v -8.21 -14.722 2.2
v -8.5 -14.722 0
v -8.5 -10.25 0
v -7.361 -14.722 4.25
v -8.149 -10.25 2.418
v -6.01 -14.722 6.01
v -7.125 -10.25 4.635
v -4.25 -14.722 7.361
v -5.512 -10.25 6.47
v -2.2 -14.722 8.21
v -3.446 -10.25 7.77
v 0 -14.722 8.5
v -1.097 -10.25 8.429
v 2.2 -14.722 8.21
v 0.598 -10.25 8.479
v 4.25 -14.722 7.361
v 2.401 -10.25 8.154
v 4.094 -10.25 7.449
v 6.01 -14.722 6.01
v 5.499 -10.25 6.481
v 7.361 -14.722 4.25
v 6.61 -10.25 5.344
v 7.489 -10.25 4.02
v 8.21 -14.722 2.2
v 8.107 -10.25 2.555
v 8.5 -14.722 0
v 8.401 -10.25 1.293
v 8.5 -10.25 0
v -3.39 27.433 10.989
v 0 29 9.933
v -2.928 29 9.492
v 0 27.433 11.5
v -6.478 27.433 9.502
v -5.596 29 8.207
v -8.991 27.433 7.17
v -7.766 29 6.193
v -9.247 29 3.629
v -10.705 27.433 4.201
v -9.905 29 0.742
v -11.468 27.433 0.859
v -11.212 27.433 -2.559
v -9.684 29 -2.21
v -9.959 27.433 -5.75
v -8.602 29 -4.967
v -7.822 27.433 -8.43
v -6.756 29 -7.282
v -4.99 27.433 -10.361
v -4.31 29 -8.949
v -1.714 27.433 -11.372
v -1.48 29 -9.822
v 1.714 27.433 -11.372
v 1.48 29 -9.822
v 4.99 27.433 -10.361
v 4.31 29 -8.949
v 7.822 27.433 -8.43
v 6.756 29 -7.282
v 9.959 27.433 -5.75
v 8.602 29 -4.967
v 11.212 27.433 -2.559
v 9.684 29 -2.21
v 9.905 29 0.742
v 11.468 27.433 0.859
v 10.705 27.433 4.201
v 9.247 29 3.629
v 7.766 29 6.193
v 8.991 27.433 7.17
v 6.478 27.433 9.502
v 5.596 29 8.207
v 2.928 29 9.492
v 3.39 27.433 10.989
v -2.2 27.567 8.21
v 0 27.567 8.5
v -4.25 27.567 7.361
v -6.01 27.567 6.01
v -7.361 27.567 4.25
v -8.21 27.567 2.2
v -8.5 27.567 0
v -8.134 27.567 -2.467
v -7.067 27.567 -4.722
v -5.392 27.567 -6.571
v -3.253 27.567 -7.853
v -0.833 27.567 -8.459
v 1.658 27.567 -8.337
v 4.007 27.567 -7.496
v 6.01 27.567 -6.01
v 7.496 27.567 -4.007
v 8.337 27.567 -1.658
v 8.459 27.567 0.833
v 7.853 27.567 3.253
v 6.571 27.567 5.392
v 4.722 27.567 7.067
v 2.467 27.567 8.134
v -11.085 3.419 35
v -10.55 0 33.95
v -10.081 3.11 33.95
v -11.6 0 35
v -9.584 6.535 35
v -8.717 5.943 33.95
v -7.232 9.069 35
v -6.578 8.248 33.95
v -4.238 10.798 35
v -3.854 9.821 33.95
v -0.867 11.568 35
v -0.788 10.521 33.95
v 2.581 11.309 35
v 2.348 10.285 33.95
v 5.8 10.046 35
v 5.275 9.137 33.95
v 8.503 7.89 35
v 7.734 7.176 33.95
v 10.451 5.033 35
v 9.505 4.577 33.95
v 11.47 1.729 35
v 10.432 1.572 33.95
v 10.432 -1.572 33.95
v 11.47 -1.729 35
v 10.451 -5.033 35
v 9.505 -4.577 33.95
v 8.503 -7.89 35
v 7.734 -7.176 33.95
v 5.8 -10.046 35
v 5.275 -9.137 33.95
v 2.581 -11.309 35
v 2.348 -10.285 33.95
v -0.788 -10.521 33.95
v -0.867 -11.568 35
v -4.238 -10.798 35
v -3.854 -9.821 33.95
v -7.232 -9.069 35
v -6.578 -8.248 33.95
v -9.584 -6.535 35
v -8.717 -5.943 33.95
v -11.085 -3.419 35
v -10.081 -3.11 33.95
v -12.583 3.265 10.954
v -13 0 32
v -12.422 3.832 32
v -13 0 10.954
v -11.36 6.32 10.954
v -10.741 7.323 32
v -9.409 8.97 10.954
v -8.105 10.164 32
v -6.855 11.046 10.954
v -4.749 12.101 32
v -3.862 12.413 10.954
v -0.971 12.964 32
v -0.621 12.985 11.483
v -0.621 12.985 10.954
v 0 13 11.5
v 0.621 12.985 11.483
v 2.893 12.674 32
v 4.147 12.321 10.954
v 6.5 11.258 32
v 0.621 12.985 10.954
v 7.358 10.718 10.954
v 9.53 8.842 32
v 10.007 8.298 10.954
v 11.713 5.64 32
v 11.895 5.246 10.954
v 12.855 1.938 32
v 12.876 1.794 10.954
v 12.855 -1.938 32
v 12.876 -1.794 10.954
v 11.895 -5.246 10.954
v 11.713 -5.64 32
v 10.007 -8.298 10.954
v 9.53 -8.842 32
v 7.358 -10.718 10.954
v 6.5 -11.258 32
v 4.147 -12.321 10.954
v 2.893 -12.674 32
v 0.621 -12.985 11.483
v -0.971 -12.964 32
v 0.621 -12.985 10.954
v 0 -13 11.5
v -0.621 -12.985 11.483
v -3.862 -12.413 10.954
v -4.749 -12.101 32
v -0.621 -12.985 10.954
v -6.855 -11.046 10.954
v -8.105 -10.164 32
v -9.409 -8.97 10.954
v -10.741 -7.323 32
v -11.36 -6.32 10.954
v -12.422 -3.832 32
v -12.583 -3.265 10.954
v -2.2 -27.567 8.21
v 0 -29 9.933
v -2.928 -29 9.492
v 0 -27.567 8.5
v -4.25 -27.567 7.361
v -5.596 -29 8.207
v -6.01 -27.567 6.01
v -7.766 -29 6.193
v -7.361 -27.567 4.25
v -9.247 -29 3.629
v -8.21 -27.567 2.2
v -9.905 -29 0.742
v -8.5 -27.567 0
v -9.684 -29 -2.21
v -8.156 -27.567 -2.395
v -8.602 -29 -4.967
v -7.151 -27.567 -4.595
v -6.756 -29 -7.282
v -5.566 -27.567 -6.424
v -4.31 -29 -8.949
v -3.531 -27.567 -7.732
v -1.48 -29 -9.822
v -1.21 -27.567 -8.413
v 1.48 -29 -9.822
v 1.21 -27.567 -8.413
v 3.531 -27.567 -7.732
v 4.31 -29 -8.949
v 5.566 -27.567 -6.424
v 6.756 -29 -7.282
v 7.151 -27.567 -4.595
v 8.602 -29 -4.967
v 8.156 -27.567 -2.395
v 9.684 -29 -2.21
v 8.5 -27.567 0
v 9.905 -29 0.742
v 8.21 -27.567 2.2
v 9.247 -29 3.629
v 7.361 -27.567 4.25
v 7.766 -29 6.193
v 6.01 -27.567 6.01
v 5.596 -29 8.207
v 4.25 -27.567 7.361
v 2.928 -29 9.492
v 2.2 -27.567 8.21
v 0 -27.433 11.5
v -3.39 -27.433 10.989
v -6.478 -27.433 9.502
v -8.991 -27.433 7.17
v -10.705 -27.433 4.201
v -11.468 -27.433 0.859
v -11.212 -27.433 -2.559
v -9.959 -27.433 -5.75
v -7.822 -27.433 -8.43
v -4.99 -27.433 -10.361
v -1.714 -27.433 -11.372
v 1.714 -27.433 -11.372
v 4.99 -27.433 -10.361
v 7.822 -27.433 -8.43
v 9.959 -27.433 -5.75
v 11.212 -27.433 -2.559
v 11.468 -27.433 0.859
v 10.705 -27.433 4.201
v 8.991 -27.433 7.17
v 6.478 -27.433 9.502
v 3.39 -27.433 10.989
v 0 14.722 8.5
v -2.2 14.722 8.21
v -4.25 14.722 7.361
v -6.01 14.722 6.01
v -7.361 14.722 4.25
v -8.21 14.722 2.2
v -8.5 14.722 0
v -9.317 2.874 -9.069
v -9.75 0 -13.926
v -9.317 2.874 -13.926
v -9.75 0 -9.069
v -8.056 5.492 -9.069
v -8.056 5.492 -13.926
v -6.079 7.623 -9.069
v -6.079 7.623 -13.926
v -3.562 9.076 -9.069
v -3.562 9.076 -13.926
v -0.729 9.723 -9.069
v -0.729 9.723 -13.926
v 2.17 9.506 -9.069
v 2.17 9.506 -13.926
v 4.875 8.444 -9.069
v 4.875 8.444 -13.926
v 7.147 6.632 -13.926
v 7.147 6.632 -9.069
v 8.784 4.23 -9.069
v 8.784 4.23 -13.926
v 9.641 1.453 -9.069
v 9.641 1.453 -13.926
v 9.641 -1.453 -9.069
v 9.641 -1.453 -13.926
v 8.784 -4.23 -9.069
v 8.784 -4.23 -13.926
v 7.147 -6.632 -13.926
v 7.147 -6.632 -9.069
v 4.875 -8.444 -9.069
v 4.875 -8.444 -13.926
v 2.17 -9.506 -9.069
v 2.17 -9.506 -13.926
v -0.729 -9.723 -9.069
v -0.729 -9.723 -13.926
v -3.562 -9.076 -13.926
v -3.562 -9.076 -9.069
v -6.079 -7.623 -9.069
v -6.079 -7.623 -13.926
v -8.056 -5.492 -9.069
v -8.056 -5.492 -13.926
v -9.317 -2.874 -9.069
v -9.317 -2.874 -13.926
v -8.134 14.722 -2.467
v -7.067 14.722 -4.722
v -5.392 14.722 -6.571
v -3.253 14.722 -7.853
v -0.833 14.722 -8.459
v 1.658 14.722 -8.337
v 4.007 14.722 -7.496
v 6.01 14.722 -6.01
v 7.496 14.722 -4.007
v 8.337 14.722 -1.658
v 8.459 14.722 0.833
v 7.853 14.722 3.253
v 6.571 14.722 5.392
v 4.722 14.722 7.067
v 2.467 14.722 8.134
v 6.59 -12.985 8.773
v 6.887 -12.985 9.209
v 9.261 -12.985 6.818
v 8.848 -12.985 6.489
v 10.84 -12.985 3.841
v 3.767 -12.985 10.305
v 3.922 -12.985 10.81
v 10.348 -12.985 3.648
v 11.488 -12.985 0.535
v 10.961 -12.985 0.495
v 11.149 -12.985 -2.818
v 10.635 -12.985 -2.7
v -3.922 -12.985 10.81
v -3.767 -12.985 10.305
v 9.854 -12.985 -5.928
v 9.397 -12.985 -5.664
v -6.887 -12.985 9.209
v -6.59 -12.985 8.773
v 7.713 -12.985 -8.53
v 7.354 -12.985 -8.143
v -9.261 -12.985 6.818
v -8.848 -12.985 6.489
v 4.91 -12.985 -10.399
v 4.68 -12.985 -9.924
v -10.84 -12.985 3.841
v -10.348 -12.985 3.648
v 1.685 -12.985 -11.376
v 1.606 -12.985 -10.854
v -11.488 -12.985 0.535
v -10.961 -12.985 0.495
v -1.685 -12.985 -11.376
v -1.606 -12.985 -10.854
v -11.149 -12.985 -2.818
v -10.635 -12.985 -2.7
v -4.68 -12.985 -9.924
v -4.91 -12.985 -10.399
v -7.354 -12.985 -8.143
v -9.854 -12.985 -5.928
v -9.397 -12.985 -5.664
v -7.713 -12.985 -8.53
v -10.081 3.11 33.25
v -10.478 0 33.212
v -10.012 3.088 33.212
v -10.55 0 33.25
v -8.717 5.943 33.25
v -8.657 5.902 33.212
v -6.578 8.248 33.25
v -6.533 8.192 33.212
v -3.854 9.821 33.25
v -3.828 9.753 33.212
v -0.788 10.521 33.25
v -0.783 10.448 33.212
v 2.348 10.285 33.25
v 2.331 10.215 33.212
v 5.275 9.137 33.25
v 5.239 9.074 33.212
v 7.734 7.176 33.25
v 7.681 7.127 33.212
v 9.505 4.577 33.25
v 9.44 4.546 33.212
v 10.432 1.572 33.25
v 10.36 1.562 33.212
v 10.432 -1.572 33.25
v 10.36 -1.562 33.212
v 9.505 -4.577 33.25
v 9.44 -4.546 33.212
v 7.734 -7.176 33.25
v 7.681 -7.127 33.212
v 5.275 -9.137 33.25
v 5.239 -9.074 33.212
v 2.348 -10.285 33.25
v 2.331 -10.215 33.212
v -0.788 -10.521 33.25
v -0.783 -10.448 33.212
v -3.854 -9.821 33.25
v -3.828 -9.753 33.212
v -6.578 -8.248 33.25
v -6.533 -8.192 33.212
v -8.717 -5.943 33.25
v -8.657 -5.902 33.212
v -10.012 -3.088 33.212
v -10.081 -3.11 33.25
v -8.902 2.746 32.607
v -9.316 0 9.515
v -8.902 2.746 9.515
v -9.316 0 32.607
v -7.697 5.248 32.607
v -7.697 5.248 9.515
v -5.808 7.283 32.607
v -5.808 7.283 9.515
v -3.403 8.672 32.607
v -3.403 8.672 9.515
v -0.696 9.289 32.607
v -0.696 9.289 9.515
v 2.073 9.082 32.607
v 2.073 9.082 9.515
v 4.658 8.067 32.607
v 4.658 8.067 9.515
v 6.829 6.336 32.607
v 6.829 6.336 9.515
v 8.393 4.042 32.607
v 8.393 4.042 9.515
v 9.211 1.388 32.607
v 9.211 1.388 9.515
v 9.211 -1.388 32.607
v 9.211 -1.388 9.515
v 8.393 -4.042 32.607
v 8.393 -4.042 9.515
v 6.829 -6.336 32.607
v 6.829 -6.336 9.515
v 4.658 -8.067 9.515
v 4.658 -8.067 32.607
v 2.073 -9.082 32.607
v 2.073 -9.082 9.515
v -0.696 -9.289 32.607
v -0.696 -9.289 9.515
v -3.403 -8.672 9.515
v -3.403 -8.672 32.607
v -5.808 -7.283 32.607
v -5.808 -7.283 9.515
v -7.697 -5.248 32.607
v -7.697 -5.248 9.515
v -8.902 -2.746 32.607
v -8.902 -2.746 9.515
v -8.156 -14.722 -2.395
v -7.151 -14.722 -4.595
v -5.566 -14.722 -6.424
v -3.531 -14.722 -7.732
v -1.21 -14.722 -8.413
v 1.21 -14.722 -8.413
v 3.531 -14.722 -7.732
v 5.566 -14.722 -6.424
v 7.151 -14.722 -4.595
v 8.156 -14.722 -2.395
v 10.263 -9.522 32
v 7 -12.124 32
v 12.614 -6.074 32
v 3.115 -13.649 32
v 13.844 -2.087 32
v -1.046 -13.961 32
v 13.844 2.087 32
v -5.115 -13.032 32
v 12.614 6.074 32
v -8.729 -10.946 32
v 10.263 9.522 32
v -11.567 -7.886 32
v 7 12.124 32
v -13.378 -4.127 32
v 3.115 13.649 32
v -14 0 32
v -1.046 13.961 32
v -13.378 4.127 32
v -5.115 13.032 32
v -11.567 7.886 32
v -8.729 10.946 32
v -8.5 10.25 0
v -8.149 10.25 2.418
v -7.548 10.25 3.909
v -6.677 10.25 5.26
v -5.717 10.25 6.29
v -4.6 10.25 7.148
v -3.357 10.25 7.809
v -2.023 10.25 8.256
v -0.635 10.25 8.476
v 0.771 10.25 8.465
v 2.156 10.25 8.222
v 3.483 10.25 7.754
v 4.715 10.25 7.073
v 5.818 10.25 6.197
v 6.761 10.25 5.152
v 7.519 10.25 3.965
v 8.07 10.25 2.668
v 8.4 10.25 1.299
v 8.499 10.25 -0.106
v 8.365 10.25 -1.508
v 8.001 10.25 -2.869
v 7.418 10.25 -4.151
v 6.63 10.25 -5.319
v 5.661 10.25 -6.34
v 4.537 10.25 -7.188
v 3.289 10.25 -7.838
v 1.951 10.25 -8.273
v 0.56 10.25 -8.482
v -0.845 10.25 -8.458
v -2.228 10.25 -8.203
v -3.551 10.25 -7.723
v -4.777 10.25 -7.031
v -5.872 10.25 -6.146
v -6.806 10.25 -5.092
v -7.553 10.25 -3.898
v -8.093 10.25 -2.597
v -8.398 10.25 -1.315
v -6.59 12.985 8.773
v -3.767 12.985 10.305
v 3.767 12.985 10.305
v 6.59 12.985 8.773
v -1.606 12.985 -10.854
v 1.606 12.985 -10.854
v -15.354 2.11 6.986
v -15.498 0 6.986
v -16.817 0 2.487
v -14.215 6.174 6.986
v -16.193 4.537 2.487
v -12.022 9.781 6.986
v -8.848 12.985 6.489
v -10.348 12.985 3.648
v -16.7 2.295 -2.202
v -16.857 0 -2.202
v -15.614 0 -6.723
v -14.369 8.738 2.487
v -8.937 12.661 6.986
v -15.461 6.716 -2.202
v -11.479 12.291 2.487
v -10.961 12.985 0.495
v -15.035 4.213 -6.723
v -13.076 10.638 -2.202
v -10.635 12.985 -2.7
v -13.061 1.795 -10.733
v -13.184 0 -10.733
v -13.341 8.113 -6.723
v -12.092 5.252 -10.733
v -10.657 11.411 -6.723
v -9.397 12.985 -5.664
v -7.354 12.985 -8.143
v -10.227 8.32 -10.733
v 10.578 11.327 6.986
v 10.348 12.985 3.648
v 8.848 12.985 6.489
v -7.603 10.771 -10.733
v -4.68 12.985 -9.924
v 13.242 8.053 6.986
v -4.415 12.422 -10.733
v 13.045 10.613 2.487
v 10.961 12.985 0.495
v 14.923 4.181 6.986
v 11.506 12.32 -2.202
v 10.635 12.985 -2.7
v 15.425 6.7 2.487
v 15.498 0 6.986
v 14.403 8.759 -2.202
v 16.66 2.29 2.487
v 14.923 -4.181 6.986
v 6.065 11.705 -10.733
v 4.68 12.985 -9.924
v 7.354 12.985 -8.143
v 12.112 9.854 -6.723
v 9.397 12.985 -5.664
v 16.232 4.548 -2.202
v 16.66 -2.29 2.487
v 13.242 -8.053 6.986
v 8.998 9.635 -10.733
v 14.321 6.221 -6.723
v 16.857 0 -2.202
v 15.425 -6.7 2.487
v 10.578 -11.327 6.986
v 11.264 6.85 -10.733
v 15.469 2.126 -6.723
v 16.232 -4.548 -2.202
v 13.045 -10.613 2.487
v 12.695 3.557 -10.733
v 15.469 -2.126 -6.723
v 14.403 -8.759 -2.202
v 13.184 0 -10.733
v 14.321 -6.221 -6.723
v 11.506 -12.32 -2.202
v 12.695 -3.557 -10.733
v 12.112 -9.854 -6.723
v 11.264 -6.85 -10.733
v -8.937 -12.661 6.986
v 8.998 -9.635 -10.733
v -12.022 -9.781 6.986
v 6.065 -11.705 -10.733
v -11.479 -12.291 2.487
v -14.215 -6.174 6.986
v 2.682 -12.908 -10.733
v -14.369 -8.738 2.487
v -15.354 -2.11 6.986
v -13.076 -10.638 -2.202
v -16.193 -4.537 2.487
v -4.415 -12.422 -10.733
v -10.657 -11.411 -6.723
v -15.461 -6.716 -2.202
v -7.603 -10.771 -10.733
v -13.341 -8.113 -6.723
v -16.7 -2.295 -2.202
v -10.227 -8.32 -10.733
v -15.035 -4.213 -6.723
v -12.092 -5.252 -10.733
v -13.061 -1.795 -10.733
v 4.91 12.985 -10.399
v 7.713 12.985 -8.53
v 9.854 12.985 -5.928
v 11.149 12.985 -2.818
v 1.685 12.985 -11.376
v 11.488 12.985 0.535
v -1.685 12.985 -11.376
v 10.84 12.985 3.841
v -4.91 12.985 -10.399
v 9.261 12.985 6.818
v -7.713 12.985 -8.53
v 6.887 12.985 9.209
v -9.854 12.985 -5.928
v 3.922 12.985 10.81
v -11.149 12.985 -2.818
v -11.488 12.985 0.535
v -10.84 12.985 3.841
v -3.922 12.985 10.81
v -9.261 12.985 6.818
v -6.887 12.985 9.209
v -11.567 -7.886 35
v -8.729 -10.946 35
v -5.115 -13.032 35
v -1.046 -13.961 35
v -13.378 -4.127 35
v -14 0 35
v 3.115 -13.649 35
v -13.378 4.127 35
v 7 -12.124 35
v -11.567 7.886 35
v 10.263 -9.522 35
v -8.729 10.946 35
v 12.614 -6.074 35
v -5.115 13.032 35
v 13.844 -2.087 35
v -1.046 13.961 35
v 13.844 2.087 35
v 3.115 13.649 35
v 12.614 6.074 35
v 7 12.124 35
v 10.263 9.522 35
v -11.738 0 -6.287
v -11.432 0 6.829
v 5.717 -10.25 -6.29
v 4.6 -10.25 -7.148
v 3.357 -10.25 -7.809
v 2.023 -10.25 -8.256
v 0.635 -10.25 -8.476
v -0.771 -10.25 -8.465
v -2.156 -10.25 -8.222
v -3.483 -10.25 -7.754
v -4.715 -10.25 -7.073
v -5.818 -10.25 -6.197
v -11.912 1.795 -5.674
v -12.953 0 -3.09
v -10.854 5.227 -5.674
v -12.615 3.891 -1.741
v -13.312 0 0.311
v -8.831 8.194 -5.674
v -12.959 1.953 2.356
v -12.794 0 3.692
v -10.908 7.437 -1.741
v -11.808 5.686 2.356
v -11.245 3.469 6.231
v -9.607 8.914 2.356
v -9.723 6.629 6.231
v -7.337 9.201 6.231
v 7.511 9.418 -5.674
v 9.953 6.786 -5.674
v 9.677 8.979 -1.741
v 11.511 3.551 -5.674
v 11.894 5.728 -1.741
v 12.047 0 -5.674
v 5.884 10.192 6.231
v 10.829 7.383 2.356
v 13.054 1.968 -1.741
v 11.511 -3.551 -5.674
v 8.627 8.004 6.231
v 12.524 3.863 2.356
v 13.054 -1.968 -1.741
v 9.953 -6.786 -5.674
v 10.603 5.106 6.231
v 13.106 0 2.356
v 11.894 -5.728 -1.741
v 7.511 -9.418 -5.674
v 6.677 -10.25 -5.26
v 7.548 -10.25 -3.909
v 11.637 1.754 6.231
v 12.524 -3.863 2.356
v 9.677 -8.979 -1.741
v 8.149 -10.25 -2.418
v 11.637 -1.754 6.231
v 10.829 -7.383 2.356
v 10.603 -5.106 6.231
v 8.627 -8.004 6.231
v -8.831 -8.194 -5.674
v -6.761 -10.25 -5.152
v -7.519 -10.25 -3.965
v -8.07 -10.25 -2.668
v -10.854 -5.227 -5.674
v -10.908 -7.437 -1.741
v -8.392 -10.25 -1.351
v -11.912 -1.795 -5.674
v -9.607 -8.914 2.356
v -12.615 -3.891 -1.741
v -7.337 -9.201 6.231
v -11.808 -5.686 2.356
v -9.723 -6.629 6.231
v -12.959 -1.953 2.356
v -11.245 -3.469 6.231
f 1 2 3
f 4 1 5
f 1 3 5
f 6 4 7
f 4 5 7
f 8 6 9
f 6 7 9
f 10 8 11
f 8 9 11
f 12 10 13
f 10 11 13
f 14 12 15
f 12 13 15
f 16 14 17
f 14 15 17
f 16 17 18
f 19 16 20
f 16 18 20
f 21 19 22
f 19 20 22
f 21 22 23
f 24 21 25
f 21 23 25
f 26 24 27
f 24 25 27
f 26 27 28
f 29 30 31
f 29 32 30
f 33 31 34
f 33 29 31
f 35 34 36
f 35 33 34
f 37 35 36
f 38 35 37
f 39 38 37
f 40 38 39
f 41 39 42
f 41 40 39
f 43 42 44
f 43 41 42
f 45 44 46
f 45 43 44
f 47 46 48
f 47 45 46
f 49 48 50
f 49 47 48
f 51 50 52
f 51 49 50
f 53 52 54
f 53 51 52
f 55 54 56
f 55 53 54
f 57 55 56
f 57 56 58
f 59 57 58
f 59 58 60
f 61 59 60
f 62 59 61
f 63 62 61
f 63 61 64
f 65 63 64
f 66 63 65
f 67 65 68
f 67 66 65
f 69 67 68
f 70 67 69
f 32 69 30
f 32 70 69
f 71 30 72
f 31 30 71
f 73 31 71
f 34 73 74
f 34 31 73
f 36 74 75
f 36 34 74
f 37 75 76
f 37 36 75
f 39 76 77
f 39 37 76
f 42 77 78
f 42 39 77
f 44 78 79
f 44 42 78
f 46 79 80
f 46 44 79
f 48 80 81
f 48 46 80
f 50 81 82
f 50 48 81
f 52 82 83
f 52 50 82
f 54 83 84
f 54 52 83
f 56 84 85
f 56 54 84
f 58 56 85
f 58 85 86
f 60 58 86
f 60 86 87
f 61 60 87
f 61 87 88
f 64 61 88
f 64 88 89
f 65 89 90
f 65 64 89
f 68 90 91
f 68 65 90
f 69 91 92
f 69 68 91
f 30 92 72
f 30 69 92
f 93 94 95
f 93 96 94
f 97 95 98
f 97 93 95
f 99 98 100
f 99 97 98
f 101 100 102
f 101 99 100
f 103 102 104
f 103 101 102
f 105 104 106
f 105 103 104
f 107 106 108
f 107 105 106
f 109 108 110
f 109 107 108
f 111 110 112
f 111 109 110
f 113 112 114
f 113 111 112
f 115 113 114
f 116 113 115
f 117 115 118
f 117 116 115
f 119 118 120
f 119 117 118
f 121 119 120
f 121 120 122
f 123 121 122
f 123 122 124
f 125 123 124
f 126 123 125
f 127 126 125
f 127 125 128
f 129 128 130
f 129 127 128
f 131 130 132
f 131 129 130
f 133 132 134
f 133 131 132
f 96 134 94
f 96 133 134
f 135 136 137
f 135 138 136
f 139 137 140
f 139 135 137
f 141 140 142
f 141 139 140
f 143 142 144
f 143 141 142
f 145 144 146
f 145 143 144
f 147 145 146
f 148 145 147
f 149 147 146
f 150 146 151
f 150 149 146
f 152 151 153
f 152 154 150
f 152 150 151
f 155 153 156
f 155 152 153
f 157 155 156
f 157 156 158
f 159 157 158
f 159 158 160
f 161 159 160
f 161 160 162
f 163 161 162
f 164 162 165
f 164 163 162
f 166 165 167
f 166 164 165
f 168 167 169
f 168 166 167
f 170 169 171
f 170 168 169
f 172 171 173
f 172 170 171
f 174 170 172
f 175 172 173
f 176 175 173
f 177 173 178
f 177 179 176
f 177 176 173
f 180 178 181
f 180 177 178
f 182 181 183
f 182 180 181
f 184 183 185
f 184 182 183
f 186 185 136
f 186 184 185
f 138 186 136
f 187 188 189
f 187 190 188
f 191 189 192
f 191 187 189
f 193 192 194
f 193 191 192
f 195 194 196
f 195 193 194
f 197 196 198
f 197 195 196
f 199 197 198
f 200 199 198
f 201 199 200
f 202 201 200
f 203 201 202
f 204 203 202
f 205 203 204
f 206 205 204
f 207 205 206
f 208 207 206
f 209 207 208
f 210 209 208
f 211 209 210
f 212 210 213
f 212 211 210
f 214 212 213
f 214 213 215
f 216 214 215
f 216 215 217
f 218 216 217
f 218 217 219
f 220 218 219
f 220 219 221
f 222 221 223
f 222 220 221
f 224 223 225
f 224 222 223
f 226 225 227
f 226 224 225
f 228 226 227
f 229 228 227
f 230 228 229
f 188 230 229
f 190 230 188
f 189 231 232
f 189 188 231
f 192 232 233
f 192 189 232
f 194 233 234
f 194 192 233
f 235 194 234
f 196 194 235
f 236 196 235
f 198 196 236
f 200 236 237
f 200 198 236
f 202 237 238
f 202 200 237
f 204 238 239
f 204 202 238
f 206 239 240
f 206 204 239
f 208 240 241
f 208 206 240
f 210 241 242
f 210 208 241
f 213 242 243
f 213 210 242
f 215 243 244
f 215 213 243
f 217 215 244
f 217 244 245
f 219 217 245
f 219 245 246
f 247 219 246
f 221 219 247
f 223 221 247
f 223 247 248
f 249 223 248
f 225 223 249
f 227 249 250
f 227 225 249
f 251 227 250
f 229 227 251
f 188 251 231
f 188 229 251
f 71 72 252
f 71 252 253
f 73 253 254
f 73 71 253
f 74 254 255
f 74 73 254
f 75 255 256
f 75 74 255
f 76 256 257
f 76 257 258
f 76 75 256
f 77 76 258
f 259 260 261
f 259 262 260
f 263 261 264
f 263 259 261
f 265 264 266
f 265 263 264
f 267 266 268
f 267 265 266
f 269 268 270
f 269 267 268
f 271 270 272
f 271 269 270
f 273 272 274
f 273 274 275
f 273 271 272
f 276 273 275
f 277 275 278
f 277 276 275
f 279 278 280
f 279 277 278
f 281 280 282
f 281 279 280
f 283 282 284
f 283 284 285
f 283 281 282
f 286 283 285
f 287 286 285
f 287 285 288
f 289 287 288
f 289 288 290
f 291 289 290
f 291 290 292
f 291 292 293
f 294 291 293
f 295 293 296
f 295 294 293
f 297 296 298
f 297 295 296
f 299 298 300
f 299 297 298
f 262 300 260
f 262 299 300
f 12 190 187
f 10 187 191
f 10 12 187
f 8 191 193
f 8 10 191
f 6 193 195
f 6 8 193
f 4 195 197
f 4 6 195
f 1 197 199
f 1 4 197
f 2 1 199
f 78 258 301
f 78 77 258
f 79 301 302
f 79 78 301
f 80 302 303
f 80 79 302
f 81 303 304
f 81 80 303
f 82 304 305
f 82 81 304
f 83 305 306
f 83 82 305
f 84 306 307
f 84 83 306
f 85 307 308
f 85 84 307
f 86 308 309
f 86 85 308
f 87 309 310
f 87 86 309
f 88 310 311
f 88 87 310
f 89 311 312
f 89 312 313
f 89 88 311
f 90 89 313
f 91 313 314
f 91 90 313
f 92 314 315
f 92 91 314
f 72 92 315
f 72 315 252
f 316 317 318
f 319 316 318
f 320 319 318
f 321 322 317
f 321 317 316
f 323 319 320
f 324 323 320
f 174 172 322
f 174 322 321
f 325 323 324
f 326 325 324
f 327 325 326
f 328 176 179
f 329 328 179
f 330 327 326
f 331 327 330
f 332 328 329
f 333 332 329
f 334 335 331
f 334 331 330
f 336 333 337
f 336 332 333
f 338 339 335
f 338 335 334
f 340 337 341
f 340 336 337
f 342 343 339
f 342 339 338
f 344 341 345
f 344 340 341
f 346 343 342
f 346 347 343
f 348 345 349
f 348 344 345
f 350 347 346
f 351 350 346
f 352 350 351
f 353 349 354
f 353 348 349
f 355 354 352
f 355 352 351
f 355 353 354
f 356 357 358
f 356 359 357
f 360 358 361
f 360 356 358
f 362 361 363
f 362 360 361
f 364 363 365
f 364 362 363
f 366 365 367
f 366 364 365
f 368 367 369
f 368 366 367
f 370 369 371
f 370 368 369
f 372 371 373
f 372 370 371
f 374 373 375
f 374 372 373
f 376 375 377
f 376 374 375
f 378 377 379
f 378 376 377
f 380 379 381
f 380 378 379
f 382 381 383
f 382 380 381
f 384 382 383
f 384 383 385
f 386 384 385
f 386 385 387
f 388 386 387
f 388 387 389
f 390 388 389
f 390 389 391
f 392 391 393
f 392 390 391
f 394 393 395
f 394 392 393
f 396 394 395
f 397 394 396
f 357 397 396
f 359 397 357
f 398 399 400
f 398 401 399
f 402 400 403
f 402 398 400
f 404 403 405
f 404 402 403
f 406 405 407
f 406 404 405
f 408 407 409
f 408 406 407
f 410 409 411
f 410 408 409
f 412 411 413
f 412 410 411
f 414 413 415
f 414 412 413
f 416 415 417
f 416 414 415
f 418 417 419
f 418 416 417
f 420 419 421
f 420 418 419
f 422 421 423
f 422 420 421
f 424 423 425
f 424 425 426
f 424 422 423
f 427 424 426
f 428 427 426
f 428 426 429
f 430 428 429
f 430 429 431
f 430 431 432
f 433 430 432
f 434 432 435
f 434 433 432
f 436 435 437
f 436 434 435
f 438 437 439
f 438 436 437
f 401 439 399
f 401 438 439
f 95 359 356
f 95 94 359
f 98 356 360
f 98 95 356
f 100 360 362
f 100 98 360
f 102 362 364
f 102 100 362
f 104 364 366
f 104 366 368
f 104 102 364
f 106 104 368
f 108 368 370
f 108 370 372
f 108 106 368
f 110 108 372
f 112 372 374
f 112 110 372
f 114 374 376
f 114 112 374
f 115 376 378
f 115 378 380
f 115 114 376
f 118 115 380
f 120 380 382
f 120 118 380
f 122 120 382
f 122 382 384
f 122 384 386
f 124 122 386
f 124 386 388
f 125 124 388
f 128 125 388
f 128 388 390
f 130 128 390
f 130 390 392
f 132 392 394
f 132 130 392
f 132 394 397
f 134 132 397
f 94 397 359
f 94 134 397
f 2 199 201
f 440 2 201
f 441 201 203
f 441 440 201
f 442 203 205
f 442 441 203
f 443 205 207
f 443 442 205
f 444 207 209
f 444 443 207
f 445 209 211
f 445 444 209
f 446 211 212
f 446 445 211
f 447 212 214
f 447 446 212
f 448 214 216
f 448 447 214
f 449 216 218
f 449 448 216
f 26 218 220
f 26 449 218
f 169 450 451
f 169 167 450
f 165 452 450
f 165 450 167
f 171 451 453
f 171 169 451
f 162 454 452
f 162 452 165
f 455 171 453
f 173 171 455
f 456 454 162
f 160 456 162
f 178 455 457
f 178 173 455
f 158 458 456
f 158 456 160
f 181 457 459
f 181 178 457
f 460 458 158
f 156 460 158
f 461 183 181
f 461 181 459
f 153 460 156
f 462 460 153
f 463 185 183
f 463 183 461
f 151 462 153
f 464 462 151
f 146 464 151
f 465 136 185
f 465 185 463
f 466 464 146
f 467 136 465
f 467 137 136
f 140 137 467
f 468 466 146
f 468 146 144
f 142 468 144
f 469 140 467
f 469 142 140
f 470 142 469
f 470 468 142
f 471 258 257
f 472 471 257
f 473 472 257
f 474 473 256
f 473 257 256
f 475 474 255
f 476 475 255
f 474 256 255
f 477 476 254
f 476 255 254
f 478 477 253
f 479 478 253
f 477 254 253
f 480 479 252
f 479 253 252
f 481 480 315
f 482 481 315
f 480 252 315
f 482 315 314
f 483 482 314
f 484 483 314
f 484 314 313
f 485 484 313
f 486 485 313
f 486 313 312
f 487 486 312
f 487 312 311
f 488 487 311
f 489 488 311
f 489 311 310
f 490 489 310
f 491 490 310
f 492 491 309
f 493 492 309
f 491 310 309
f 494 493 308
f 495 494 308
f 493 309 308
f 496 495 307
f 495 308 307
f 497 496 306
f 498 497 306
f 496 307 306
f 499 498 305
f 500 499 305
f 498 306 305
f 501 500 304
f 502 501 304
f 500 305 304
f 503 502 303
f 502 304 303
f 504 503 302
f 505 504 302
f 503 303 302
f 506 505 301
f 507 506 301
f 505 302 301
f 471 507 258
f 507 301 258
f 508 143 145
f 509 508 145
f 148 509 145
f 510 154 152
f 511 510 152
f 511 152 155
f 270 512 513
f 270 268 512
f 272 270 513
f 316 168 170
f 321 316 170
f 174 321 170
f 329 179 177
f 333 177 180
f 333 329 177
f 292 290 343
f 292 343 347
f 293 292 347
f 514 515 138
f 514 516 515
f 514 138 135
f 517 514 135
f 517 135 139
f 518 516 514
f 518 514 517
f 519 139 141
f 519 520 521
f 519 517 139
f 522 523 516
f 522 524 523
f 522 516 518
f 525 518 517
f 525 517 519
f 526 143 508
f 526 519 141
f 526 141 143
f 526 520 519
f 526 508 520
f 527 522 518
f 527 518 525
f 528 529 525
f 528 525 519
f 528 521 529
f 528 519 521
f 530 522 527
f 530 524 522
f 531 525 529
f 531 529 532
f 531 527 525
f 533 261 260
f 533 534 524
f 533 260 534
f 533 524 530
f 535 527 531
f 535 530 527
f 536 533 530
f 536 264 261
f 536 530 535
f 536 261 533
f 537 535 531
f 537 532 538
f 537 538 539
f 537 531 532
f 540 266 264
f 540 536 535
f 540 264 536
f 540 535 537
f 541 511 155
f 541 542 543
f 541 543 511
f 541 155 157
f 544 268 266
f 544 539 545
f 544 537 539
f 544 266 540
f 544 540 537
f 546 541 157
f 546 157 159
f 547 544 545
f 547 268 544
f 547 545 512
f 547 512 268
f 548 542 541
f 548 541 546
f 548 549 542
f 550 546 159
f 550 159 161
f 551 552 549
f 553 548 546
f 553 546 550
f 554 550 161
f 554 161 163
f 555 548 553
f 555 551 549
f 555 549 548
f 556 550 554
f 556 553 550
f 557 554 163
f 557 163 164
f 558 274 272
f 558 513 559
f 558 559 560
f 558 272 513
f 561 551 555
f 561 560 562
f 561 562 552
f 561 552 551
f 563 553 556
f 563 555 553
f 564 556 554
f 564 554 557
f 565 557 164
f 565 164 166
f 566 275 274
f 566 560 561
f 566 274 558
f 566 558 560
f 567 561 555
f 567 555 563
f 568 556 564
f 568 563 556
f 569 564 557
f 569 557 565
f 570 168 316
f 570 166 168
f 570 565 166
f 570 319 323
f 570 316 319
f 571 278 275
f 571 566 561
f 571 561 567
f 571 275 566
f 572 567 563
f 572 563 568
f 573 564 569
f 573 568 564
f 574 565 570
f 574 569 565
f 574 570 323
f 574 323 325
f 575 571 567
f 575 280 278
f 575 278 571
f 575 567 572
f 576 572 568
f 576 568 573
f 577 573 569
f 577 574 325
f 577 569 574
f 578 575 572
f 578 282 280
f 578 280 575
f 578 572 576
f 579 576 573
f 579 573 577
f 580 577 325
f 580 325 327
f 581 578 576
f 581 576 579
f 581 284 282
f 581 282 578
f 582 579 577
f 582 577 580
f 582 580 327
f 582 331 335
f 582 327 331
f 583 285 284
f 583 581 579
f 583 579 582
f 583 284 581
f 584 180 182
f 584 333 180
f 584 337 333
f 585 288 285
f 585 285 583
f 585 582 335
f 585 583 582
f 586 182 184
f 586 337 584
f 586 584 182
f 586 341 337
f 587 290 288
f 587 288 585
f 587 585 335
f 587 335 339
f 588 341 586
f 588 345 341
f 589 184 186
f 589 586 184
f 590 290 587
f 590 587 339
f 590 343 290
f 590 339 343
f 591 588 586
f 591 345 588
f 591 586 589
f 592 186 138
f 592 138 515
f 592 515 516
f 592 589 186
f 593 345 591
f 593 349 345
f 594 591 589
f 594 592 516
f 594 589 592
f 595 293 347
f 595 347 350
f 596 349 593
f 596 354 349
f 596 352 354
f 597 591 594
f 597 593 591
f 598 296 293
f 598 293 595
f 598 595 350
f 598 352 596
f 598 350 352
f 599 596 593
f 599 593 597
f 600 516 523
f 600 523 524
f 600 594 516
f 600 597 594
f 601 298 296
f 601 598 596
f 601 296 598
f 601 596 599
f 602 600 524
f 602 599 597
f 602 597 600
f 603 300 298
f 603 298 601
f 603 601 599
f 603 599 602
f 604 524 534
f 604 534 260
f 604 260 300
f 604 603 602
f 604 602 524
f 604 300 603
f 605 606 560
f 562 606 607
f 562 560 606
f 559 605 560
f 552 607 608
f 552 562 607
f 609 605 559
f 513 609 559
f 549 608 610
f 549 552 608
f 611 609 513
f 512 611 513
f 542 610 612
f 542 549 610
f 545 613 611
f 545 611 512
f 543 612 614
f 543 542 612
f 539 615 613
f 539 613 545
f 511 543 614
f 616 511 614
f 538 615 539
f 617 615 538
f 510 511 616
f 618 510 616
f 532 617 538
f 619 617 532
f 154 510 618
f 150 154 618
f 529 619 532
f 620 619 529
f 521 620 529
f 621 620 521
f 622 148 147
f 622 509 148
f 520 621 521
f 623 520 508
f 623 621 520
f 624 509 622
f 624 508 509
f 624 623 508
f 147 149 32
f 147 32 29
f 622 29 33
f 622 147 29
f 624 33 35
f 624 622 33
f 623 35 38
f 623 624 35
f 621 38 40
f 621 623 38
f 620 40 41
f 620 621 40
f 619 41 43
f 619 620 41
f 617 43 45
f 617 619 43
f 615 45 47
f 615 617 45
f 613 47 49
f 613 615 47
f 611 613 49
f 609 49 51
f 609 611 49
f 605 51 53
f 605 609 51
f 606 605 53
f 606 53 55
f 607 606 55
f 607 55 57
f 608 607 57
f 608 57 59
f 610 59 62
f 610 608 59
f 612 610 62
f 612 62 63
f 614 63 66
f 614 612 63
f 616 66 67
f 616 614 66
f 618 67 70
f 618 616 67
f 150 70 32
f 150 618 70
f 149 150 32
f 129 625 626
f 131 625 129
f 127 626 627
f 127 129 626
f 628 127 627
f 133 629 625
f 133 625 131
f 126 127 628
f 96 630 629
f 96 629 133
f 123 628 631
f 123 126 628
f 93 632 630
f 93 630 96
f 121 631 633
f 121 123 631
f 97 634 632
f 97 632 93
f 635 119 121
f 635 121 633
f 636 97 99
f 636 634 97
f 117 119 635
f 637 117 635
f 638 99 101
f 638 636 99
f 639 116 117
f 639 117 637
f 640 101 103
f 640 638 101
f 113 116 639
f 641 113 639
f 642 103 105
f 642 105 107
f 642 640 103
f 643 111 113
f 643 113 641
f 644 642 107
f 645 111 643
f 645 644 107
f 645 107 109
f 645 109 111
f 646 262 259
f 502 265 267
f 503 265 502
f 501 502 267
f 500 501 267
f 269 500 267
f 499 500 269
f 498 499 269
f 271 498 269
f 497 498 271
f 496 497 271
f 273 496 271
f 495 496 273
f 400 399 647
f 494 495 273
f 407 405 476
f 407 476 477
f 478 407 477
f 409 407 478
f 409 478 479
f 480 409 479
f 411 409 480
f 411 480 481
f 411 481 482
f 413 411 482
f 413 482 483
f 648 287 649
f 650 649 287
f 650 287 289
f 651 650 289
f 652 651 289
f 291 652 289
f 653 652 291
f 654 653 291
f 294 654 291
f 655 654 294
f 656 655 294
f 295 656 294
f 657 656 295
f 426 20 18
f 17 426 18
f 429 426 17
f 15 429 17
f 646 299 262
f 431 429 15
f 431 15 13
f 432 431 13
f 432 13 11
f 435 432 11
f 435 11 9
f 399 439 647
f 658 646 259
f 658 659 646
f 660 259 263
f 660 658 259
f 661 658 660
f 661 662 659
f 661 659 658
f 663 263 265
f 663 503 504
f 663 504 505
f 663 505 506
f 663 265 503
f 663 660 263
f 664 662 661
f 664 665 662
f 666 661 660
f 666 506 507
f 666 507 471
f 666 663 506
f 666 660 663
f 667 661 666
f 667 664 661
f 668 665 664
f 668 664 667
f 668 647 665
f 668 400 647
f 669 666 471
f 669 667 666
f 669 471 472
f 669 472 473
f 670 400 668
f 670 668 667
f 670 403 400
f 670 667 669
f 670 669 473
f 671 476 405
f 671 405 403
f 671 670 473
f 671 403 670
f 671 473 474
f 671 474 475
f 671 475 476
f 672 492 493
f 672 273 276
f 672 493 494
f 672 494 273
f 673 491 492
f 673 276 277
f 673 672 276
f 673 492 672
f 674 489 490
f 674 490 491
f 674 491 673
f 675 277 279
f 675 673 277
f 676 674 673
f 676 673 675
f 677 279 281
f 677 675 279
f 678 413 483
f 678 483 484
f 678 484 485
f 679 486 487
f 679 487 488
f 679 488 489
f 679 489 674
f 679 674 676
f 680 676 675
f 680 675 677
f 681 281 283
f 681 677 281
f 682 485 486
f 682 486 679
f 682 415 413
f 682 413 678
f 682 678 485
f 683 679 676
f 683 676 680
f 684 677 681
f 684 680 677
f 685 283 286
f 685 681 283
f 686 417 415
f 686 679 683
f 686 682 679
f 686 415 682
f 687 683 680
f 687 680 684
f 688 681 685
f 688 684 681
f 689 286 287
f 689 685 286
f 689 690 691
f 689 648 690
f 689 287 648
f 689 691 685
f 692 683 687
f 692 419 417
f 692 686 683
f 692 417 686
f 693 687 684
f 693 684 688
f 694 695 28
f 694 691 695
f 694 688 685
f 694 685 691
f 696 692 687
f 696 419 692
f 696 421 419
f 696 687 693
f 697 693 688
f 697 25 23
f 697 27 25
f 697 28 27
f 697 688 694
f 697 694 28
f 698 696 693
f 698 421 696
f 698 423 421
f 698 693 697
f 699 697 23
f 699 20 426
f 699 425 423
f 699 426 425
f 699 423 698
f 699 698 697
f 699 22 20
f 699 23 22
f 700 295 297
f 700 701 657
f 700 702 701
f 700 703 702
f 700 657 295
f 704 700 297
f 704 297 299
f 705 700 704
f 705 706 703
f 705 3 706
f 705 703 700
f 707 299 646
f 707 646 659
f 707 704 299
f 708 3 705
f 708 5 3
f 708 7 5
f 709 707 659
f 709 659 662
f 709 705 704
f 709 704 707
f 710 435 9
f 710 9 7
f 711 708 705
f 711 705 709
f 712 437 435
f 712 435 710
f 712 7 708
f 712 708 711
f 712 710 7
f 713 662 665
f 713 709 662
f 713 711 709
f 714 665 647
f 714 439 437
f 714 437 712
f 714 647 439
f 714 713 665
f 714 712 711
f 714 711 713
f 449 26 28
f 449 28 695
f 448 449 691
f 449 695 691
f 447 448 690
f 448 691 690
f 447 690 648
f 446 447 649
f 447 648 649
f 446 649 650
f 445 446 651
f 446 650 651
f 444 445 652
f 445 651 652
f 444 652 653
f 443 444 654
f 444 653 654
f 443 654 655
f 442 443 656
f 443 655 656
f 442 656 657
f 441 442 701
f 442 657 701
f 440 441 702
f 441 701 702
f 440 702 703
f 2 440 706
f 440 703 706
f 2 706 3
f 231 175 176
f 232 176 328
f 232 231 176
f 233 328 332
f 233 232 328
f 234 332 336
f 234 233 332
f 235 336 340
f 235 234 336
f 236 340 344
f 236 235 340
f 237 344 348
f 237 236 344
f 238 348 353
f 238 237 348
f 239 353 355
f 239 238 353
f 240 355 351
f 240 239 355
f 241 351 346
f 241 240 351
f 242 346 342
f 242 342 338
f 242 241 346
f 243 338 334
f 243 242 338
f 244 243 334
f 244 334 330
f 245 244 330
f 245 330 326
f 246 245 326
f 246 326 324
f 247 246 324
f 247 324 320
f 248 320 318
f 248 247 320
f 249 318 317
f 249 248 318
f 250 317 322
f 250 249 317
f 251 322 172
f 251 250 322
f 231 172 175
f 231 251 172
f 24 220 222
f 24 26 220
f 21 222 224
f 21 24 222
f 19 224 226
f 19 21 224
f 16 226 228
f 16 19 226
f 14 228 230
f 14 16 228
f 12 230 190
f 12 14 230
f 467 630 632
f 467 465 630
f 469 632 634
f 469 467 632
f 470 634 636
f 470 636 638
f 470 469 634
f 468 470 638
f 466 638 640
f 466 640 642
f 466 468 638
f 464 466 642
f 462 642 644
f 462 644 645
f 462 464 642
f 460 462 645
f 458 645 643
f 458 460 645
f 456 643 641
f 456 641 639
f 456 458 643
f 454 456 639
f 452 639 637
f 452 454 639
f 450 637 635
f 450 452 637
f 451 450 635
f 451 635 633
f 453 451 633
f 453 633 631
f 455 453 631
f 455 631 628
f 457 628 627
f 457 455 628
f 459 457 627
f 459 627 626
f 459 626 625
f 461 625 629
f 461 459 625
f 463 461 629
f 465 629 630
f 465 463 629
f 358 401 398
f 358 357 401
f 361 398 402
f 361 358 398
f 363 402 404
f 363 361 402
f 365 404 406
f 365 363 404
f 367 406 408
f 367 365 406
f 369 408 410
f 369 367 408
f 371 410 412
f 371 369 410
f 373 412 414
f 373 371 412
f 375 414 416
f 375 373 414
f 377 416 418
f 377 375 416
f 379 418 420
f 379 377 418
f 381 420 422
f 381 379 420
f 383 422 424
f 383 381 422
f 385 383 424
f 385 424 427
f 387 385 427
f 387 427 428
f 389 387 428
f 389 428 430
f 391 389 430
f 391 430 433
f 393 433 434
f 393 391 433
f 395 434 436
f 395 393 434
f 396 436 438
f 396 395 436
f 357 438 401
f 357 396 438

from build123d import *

# Parameters (mm, degrees)
F5_D     = 17
F5_DEPTH = 29
F5_TIP   = 5.1073152617
F6_D     = 17
F6_DEPTH = 29
F6_TIP   = 5.1073152617


with BuildPart() as f2:
    # F0 (on Front) → F2 (revolve)
    with BuildSketch(Plane.XZ):
        with BuildLine():
            Line((-9.3155, 9.5151098654), (-9.3155, 14.2204591962))
            ThreePointArc((-9.3155, 14.2204591962), (-11.2766168332, 12.7215530812), (-13, 10.9544511501))
            ThreePointArc((-13, 10.9544511501), (-16.8567978778, -2.2019003855), (-9.75, -13.9261444772))
            Line((-9.75, -13.9261444772), (-9.75, -9.069363594))
            ThreePointArc((-9.75, -9.069363594), (-13.3123621496, 0.311239453), (-9.3155, 9.5151098654))
        make_face()
        with BuildLine():
            ThreePointArc((-13, 10.9544511501), (-11.2766168332, 12.7215530812), (-9.3155, 14.2204591962))
            Line((-9.3155, 14.2204591962), (-9.3155, 19.2122588888))
            Line((-9.3155, 19.2122588888), (-10.4775, 19.2122588888))
            Line((-10.4775, 19.2122588888), (-10.4775, 33.2122588888))
            Line((-10.4775, 33.2122588888), (-10.55, 33.25))
            Line((-10.55, 33.25), (-10.55, 33.95))
            Line((-10.55, 33.95), (-11.6, 35))
            Line((-11.6, 35), (-14, 35))
            Line((-14, 35), (-14, 32))
            Line((-14, 32), (-13, 32))
            Line((-13, 32), (-13, 10.9544511501))
        make_face()
        Polygon((-10.4775, 19.2122588888), (-9.3155, 19.2122588888), (-9.3155, 32.6073599761), (-10.4775, 33.2122588888), align=None)
    revolve(axis=Axis((0, 0, 10.842), (0, 0, -1)))

    # F1 (on Right) → F3 (revolve)
    with BuildSketch(Plane.YZ):
        with BuildLine():
            Line((27.5668407641, 8.5), (29, 9.9331592359))
            Line((29, 9.9331592359), (27.4331592359, 11.5))
            Line((27.4331592359, 11.5), (12.9851644874, 11.5))
            Line((12.9851644874, 11.5), (12.9851644874, 10.9720327759))
            ThreePointArc((12.9851644874, 10.9720327759), (13.9088267086, 9.7746887209), (14.7224318643, 8.5))
            Line((14.7224318643, 8.5), (27.5668407641, 8.5))
        make_face()
    revolve(axis=Axis((0, 4.3193821889, 0), (0, -1, 0)))

    # F1 (on Right) → F4 (revolve)
    with BuildSketch(Plane.YZ):
        with BuildLine():
            Line((-27.5668407641, 8.5), (-14.7224318643, 8.5))
            ThreePointArc((-14.7224318643, 8.5), (-13.9088267086, 9.7746887209), (-12.9851644874, 10.9720327759))
            Line((-12.9851644874, 10.9720327759), (-12.9851644874, 11.5))
            Line((-12.9851644874, 11.5), (-27.4331592359, 11.5))
            Line((-27.4331592359, 11.5), (-29, 9.9331592359))
            Line((-29, 9.9331592359), (-27.5668407641, 8.5))
        make_face()
    revolve(axis=Axis((0, 4.3193821889, 0), (0, -1, 0)))

    # F5 (one way)
    with BuildSketch(Plane(origin=(0, 0, 0), x_dir=(1, 0, 0), z_dir=(0, 1, 0))):
        with Locations((0, 0)):
            Circle(F5_D / 2)
    extrude(amount=-F5_DEPTH, mode=Mode.SUBTRACT)
    with Locations(Plane(origin=(0, 0, 0), x_dir=(1, 0, 0), z_dir=(0, 1, 0))):
        with Locations((0, 0)):
            with Locations((0, 0, -(F5_DEPTH + F5_TIP / 2))):  # 118° drill point
                Cone(0, F5_D / 2, F5_TIP, mode=Mode.SUBTRACT)

    # F6
    with Locations(Plane.XZ):
        with Locations((0, 0)):
            Hole(F6_D / 2, depth=F6_DEPTH)
            with Locations((0, 0, -(F6_DEPTH + F6_TIP / 2))):  # 118° drill point
                Cone(0, F6_D / 2, F6_TIP, mode=Mode.SUBTRACT)


solid = f2.part
